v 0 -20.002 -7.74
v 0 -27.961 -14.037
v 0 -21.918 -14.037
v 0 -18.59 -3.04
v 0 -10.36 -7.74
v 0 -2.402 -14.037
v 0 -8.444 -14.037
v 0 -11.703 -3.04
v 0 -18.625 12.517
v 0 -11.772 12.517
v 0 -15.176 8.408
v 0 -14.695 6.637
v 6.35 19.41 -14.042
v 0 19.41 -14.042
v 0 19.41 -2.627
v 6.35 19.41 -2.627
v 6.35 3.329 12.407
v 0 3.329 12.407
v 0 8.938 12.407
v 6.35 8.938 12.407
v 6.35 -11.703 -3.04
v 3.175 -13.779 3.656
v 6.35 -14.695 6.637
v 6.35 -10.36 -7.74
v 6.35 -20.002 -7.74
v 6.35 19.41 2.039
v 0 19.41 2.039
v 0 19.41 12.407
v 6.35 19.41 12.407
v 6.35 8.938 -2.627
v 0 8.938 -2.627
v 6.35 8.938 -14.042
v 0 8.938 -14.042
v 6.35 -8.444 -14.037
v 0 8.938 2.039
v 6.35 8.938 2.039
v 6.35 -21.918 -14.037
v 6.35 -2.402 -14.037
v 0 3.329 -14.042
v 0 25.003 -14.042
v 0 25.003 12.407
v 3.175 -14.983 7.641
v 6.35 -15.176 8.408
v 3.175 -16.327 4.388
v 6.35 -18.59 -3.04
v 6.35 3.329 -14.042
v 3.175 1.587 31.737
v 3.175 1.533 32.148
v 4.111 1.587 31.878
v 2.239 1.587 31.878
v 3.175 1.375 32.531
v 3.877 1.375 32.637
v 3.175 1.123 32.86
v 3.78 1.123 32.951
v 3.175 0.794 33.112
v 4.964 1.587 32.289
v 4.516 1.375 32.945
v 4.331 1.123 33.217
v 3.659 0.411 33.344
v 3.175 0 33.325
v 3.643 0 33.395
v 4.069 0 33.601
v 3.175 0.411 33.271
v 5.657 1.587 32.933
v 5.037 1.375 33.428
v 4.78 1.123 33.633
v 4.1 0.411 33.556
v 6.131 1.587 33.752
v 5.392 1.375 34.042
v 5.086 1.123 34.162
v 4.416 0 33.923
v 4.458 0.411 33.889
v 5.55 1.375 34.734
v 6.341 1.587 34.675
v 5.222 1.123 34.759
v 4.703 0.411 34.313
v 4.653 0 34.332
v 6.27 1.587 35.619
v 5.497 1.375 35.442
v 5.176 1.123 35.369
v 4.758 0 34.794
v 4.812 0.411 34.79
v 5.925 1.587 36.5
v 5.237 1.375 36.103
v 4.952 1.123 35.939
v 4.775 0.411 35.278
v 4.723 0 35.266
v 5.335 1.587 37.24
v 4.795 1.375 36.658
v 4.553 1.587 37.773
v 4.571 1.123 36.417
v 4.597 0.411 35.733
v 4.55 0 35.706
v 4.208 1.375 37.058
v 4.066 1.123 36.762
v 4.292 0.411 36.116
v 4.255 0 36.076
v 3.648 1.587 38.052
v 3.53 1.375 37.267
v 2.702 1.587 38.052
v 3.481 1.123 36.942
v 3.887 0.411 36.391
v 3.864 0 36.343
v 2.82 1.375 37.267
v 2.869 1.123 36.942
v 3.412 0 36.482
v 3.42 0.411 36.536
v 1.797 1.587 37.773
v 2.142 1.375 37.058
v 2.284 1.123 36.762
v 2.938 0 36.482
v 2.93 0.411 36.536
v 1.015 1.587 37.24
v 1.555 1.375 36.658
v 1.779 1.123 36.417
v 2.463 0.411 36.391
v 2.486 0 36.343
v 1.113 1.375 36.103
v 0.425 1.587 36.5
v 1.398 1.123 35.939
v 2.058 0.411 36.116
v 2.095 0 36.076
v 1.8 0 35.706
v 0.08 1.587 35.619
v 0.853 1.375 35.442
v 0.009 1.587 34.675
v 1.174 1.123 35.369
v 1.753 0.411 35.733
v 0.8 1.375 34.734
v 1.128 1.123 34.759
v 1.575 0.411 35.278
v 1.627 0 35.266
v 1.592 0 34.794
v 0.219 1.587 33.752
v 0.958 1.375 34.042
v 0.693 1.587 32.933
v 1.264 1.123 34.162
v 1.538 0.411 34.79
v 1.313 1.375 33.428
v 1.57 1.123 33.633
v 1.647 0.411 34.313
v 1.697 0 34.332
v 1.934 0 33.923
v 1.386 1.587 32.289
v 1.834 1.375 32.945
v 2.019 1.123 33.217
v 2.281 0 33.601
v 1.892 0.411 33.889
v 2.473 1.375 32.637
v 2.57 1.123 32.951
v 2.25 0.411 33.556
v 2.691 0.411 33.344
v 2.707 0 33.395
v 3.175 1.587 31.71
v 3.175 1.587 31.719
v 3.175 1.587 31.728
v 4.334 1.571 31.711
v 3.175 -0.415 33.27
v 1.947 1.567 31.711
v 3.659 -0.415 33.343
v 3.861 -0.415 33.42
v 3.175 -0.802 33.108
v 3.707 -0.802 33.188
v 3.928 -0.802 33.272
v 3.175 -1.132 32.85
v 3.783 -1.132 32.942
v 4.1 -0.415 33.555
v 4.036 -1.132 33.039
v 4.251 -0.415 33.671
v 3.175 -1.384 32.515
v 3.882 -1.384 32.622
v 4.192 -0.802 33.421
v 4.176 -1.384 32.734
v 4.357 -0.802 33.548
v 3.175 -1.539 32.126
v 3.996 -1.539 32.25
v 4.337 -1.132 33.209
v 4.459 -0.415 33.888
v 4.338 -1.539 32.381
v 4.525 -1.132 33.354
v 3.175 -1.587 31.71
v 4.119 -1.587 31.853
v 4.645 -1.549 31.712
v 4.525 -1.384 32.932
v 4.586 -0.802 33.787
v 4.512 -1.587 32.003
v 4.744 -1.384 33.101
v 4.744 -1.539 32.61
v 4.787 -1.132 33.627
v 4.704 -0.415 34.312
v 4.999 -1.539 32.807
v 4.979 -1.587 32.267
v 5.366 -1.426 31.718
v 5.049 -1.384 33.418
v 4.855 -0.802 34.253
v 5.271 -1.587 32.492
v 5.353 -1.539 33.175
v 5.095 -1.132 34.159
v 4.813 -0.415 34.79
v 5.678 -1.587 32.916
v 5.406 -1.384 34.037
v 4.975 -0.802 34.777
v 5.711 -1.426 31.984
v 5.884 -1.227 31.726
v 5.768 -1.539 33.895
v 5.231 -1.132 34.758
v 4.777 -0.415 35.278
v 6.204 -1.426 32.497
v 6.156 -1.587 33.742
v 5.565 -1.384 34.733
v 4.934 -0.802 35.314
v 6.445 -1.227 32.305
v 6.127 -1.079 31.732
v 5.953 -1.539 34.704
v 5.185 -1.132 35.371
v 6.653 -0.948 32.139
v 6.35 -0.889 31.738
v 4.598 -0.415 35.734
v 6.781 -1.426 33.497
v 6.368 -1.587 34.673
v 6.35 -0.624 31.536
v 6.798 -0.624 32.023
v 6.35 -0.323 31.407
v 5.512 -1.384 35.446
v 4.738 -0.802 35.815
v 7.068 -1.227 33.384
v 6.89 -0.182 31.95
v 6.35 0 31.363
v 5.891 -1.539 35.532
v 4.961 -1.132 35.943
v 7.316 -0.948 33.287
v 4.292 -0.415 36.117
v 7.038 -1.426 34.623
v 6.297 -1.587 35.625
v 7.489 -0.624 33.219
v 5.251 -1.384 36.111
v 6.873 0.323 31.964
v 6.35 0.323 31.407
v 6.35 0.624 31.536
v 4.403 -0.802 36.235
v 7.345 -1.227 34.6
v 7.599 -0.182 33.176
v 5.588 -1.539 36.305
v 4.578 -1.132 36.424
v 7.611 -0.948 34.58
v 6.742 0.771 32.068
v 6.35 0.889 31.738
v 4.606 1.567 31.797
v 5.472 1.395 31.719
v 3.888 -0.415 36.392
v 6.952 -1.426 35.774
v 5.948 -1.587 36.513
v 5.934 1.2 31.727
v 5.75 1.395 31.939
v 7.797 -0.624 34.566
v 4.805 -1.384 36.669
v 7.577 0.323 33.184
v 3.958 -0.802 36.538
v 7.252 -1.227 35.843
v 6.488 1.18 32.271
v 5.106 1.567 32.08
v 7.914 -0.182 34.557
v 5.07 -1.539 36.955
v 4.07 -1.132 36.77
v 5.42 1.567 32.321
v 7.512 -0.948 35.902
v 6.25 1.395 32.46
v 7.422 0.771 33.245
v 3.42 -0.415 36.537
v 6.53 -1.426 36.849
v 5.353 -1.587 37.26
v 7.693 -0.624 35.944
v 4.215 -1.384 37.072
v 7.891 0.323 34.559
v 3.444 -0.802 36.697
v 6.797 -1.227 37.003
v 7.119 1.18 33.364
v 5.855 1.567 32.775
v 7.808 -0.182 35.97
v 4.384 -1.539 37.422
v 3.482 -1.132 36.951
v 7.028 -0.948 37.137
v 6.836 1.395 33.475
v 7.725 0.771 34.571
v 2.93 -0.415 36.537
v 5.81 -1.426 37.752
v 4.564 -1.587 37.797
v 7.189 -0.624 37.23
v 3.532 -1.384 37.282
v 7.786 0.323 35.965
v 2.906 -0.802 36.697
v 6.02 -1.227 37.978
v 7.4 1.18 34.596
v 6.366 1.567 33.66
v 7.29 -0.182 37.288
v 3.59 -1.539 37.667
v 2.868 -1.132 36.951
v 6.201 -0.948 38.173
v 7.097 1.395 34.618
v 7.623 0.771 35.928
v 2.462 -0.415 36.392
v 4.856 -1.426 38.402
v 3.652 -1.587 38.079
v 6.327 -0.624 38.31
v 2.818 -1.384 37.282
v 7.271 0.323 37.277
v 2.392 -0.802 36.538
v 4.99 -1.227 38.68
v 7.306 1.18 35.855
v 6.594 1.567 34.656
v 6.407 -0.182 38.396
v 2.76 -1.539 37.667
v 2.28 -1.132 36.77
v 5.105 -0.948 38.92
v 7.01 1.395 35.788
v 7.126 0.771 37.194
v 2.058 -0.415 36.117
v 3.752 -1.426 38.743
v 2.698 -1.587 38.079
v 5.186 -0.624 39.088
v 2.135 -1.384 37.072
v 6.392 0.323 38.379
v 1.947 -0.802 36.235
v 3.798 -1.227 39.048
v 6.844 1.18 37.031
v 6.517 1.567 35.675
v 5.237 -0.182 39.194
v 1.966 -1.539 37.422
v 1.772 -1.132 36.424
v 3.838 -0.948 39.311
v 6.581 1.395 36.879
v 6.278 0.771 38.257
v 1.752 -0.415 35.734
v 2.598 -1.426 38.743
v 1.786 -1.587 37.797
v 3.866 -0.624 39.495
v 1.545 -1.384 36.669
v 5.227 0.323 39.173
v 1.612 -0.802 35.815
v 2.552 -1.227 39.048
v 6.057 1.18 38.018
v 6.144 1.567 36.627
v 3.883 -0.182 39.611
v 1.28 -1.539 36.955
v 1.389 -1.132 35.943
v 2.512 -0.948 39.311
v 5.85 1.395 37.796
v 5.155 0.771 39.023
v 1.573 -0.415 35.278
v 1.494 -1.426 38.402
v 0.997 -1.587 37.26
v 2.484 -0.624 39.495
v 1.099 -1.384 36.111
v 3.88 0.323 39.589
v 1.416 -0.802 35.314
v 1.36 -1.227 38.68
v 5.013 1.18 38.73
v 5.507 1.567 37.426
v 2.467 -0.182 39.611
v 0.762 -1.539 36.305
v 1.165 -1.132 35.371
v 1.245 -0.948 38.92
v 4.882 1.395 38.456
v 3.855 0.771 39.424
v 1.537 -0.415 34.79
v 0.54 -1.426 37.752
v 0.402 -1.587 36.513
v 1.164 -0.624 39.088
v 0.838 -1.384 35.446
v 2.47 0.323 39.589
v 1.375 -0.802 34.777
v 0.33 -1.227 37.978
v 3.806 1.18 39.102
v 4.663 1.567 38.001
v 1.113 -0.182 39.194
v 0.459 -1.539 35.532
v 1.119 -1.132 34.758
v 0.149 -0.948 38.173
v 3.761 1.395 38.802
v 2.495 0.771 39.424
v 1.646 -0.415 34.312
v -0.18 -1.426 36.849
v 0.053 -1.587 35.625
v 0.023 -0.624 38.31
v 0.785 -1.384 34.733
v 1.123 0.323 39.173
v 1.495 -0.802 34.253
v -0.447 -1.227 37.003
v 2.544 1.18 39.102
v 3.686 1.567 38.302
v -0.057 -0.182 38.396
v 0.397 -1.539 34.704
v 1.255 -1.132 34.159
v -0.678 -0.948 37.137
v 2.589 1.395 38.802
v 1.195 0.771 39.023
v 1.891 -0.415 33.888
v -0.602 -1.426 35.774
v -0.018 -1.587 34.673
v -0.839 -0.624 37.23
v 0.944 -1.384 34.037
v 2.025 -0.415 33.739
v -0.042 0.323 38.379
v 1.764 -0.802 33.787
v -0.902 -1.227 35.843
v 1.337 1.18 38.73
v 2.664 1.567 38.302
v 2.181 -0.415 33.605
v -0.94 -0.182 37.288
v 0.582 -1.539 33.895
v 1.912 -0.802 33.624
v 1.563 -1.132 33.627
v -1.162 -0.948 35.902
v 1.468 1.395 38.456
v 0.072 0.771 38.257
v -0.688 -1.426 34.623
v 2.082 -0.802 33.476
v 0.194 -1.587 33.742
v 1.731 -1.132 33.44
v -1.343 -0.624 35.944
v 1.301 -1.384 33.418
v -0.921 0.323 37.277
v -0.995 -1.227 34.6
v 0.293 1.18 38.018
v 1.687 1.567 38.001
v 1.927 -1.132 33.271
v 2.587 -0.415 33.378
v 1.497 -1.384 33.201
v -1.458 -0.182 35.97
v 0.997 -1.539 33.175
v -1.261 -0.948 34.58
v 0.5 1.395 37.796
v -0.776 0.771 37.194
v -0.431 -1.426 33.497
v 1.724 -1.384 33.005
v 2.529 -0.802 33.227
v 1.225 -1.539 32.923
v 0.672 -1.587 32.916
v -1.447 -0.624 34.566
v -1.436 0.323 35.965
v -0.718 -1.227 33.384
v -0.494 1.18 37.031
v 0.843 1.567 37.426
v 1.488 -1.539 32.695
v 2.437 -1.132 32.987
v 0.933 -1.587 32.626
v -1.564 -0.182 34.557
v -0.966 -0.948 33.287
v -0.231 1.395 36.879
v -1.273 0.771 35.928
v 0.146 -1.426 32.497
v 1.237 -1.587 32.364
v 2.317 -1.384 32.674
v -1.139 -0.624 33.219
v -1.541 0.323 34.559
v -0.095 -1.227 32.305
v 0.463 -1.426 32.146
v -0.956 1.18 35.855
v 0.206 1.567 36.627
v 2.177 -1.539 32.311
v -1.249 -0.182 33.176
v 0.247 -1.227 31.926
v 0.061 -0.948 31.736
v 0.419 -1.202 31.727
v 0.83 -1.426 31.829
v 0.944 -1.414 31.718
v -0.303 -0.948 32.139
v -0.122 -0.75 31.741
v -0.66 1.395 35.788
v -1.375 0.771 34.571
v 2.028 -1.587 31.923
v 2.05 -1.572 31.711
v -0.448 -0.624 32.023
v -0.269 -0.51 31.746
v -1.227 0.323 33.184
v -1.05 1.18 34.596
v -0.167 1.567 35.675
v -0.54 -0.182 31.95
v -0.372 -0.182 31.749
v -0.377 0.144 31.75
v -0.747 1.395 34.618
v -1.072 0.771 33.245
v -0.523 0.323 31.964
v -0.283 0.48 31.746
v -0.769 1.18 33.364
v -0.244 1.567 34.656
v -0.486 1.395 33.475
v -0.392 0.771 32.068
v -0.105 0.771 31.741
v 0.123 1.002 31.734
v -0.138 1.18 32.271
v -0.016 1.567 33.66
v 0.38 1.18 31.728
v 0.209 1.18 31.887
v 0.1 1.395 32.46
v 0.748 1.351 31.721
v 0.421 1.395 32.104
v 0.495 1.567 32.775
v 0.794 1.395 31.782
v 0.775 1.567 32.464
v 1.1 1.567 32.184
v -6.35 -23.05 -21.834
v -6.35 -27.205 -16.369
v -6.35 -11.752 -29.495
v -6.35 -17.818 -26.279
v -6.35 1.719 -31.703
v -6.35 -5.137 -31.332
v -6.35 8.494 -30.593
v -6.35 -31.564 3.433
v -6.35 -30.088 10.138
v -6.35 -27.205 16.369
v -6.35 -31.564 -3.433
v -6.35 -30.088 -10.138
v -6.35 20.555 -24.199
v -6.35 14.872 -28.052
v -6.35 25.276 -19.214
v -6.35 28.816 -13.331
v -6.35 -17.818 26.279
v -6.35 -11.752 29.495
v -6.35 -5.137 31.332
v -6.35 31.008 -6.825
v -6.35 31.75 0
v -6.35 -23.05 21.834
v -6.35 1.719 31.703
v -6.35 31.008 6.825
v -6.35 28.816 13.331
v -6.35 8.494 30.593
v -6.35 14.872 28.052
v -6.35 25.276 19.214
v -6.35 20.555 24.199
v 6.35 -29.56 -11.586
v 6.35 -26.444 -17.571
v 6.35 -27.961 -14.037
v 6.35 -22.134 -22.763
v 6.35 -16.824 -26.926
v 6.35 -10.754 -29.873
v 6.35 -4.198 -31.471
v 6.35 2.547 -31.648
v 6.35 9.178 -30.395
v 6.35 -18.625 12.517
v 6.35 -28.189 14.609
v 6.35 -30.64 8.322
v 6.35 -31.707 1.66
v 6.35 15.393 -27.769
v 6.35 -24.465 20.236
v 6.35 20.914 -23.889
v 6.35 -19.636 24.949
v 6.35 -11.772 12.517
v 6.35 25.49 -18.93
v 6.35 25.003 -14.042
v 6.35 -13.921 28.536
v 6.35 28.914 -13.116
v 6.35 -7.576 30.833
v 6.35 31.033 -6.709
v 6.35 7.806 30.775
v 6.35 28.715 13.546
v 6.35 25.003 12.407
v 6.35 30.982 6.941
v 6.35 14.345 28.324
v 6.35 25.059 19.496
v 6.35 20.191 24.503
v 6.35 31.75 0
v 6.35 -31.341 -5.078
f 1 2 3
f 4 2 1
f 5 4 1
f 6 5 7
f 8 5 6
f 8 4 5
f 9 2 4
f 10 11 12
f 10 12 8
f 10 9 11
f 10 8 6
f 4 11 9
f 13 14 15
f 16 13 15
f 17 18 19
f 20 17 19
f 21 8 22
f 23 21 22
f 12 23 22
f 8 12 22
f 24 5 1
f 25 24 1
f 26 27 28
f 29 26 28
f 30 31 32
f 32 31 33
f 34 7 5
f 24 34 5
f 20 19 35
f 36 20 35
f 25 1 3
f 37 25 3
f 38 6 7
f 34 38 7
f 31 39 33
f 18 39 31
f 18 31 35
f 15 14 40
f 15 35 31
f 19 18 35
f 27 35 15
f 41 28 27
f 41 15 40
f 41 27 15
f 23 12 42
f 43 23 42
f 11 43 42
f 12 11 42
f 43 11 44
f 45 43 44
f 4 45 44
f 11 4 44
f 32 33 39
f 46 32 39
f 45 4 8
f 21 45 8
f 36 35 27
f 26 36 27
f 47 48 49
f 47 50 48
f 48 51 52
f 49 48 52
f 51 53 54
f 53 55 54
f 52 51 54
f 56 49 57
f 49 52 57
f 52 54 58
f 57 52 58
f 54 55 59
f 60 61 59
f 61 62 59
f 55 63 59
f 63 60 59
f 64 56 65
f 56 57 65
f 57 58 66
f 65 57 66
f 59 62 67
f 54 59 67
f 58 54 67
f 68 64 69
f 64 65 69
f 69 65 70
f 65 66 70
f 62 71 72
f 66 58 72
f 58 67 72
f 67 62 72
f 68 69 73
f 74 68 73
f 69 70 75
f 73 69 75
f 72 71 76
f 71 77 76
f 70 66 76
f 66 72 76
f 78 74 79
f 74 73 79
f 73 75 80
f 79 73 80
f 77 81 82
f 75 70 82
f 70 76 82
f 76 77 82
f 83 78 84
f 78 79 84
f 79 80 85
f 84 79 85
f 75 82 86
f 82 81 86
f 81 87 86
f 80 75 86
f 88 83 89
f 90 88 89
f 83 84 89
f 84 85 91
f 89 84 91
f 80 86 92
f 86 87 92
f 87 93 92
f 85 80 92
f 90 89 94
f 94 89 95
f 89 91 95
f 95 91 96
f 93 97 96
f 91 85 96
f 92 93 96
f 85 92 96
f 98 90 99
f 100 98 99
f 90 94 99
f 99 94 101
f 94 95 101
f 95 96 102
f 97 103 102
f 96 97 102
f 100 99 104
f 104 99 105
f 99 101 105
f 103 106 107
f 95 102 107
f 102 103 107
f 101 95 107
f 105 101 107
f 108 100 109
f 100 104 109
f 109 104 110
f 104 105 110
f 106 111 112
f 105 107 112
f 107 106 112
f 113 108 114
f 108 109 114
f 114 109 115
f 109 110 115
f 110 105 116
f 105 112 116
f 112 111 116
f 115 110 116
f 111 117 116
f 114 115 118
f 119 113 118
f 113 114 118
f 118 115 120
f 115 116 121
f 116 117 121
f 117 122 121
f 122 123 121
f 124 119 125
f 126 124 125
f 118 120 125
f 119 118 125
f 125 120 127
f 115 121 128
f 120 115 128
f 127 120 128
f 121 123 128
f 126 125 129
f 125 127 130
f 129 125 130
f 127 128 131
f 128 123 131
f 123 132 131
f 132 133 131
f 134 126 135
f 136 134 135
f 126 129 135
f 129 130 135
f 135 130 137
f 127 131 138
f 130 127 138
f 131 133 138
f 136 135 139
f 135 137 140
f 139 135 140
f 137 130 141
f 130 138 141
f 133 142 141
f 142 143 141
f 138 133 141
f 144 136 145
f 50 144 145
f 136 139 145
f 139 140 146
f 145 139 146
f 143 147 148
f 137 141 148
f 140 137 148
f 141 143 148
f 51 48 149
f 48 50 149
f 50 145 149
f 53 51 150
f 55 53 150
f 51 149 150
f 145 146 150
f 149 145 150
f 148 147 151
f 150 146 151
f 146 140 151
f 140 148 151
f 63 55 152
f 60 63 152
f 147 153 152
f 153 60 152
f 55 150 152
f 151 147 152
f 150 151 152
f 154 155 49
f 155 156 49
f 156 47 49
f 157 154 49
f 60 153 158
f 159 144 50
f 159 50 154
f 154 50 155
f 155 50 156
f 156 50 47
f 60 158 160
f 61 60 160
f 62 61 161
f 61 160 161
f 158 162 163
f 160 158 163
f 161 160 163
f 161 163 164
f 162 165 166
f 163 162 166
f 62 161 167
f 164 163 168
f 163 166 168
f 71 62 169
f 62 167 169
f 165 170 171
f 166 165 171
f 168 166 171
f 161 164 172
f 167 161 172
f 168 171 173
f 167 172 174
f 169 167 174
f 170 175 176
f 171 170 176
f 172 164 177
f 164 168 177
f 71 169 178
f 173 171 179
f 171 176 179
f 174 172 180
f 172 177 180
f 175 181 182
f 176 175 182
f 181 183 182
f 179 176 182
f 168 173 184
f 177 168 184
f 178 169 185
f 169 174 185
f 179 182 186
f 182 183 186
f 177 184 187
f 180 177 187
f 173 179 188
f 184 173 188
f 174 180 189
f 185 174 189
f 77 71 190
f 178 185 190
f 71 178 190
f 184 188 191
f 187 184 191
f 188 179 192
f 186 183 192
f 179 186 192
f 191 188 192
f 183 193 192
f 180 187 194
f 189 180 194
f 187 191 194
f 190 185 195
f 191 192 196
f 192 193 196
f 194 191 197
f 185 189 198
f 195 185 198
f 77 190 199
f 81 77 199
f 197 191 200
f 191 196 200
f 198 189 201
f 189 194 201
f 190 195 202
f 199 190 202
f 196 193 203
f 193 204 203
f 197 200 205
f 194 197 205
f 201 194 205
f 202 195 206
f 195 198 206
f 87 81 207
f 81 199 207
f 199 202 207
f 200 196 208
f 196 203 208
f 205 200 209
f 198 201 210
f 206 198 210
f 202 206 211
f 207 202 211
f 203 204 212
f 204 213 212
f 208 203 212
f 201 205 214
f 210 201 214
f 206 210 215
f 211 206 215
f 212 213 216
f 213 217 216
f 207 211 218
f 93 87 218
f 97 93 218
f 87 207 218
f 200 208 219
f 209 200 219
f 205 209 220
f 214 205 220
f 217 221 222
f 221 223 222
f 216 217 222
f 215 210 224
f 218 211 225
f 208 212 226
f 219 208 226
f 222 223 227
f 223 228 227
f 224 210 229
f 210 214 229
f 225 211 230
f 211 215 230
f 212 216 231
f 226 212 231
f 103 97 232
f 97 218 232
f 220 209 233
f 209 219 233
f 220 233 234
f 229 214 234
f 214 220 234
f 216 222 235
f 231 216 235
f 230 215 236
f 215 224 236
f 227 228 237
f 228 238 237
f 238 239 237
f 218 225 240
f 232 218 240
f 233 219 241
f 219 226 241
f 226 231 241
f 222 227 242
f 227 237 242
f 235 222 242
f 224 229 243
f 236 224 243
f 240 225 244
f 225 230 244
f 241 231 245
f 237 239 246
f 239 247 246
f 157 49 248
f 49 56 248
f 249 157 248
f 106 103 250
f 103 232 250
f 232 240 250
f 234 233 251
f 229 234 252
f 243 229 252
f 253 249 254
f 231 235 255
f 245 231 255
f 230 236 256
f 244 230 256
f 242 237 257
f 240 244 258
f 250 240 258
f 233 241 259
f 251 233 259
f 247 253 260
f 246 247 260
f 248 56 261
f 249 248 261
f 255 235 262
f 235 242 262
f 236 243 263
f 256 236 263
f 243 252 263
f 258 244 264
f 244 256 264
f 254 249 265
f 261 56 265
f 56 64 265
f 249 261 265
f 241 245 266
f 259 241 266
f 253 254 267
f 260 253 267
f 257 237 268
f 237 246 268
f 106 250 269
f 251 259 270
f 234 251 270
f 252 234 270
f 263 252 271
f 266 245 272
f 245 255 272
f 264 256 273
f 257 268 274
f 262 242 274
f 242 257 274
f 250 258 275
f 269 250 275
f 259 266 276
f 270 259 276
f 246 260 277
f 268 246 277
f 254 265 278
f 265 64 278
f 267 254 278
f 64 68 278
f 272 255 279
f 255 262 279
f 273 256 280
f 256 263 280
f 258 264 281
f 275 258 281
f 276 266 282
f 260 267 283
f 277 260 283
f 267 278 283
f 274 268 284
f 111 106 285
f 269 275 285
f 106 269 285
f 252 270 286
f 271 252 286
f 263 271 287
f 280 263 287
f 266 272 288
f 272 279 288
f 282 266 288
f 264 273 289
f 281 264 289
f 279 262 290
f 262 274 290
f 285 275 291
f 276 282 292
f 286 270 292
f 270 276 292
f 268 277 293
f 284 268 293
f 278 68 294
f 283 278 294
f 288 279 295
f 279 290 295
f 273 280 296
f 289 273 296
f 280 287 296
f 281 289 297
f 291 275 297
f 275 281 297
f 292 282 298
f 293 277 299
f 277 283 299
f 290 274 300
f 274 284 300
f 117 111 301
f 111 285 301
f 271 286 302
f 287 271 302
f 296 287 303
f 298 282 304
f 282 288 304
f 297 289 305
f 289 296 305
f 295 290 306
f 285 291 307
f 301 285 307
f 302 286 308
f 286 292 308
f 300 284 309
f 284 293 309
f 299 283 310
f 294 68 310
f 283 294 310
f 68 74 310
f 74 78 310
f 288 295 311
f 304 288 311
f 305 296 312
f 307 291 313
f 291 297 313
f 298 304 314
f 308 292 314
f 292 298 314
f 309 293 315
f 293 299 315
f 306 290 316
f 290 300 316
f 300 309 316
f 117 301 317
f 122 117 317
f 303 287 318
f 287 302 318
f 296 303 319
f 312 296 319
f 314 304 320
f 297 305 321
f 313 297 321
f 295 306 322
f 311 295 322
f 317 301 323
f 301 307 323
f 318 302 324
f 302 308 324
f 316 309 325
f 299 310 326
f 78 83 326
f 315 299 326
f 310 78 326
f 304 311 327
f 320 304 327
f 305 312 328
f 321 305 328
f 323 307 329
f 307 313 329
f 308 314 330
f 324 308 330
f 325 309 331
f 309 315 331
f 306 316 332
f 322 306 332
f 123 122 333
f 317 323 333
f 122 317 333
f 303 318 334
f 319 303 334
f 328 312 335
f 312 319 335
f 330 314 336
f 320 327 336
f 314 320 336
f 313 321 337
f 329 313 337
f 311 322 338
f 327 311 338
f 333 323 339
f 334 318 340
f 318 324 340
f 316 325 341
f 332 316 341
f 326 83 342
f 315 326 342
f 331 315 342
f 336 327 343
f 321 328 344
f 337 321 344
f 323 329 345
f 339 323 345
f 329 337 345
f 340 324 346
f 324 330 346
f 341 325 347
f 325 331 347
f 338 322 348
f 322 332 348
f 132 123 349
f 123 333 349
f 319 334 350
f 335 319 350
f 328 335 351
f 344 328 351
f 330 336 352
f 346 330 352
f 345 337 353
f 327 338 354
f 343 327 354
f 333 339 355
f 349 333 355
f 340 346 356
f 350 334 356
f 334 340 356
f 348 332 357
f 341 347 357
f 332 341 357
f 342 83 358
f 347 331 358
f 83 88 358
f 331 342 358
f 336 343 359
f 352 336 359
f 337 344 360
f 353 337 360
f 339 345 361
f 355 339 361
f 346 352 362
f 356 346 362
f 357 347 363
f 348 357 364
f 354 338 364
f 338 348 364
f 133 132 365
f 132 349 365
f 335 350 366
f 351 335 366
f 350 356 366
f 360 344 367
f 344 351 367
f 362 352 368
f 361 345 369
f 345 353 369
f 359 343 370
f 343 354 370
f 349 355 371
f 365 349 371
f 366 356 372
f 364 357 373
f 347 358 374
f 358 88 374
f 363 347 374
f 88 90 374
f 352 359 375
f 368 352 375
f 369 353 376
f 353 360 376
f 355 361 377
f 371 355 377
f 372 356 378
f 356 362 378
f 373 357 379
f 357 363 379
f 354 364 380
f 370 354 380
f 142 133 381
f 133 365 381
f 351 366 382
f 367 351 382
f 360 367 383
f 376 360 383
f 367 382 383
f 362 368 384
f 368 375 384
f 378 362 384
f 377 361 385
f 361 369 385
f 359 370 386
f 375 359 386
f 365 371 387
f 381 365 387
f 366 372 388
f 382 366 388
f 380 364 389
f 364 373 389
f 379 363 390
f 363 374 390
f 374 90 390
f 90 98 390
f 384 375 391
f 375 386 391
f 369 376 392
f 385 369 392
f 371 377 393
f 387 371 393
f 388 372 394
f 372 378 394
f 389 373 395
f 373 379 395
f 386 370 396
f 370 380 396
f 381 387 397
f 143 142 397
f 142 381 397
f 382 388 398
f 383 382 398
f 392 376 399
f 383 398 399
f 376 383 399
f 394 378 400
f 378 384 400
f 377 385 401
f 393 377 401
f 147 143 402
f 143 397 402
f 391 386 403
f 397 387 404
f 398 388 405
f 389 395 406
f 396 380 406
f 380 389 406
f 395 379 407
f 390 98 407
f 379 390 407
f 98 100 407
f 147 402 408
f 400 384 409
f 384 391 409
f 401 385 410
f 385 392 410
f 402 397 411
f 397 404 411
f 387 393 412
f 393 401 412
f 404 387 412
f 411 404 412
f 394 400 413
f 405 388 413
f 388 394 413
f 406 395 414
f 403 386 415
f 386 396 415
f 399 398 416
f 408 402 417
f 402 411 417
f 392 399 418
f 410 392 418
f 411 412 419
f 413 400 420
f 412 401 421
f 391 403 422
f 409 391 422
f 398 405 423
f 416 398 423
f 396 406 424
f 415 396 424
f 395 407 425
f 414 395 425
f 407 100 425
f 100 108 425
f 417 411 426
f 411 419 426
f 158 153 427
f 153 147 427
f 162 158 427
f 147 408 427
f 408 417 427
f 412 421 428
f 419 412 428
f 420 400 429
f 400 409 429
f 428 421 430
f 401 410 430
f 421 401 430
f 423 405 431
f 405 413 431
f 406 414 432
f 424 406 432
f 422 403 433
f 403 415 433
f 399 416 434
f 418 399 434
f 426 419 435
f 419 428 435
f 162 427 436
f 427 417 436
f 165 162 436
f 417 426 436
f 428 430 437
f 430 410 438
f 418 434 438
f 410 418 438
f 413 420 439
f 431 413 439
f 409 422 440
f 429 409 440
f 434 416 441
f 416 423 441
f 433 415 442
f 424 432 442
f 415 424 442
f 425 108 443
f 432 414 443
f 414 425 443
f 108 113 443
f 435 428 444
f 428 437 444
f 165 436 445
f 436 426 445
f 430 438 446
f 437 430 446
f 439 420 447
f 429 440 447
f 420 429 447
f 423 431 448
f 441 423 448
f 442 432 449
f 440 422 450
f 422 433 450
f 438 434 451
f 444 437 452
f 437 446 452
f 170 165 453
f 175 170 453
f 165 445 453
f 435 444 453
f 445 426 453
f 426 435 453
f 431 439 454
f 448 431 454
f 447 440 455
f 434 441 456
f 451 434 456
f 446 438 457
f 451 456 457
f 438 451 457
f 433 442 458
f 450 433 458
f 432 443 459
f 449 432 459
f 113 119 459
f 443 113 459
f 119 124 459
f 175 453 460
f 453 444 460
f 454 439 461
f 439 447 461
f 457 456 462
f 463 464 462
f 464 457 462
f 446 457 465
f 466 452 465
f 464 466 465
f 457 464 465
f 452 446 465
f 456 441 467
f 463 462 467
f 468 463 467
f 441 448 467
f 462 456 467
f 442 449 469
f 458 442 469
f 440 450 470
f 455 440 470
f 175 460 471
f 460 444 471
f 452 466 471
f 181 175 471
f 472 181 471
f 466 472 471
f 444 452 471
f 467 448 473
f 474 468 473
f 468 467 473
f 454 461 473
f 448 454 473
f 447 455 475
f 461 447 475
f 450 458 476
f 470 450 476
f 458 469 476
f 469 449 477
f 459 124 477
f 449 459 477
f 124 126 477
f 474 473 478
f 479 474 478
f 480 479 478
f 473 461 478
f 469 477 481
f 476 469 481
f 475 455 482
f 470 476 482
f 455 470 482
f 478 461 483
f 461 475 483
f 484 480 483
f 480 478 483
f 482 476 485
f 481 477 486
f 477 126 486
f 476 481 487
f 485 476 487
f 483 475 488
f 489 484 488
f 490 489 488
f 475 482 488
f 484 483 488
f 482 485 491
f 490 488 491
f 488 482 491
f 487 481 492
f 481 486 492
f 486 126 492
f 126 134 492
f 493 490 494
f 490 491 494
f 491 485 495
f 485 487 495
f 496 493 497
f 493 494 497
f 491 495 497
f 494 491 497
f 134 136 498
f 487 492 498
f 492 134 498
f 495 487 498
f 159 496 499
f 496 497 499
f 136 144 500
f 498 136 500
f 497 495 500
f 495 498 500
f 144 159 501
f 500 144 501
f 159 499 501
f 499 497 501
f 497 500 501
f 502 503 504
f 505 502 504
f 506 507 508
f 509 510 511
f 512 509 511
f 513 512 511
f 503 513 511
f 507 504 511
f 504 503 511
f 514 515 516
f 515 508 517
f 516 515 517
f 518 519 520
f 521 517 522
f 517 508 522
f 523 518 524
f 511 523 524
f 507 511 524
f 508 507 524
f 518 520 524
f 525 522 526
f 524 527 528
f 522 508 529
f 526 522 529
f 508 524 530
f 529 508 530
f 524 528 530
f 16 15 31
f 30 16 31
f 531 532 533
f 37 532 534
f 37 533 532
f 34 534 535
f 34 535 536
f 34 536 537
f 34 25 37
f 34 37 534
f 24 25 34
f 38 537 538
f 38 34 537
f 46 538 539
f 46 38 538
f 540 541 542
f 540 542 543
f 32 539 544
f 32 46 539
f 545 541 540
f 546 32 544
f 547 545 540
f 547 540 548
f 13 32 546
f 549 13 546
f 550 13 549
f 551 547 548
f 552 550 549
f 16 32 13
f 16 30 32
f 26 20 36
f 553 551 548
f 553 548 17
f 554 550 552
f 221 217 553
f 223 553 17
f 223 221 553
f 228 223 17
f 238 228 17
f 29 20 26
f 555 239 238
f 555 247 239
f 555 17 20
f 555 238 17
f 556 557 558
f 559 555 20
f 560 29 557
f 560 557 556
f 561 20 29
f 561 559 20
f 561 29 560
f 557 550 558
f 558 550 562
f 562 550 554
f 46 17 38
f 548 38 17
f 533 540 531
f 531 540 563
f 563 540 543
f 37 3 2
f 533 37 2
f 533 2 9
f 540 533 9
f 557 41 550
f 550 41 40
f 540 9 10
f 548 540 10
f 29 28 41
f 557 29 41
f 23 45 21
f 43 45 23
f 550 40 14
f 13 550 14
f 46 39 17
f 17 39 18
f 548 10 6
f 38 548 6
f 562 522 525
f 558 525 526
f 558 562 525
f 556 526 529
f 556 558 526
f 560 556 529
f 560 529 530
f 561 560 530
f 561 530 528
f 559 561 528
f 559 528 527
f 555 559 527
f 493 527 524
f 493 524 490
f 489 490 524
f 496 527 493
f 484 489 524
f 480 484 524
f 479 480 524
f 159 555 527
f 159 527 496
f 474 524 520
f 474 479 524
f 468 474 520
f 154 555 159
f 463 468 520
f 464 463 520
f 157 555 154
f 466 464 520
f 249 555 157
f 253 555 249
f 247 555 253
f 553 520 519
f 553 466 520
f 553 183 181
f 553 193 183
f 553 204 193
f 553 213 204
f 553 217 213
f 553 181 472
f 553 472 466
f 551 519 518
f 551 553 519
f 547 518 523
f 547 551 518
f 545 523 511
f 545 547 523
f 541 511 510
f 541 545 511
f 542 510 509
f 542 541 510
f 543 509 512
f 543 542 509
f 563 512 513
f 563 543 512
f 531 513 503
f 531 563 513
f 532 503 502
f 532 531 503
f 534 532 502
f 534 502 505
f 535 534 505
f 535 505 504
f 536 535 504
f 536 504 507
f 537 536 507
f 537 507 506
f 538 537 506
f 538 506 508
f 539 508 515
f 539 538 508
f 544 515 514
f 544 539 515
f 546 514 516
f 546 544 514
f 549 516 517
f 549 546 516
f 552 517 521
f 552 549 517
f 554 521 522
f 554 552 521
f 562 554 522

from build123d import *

# Parameters (mm, degrees)
F1_R     = 31.75
F2_DEPTH = 6.35
F0_R     = 31.75
F3_DEPTH = 6.35
F4_DEPTH = 6.35


with BuildPart() as f2:
    # F1 (on Right) → F2 (new body)
    with BuildSketch(Plane.YZ):
        Circle(F1_R)
        Polygon((-2.4019205729, -14.036842106), (-8.4443424479, -14.036842106), (-10.3600911458, -7.7397587727), (-20.0025, -7.7397587727), (-21.9182486979, -14.036842106), (-27.9606705729, -14.036842106), (-18.6250130208, 12.5174026857), (-11.7723046875, 12.5174026857), align=None, mode=Mode.SUBTRACT)
        Polygon((25.0025882936, 12.4073878214), (25.0025882936, -14.0424445271), (19.4104372652, -14.0424445271), (19.4104372652, -2.6265834216), (8.9381792835, -2.6265834216), (8.9381792835, -14.0424445271), (3.3286613264, -14.0424445271), (3.3286613264, 12.4073878214), (8.9381792835, 12.4073878214), (8.9381792835, 2.0393314117), (19.4104372652, 2.0393314117), (19.4104372652, 12.4073878214), align=None, mode=Mode.SUBTRACT)
    extrude(amount=F2_DEPTH)

    # F0 (on Right) → F3 (join)
    with BuildSketch(Plane.YZ):
        Circle(F0_R)
    extrude(amount=-F3_DEPTH)

    # F1 (on Right) → F4 (join)
    with BuildSketch(Plane.YZ):
        with BuildLine():
            Line((-18.5902864583, -3.0400973143), (-11.7028515625, -3.0400973143))
            add(Edge.make_bspline(
                [(-11.7028515625, -3.0400973143), (-14.3594335937, 5.5142125815), (-14.6951236979, 6.6370381023)],
                knots=[0, 0, 0, 1, 1, 1], degree=2))
            add(Edge.make_bspline(
                [(-14.6951236979, 6.6370381023), (-15.0308138021, 7.7598636232), (-15.1755078125, 8.4080927898)],
                knots=[0, 0, 0, 1, 1, 1], degree=2))
            add(Edge.make_bspline(
                [(-15.1755078125, 8.4080927898), (-15.7716471354, 6.0929886232), (-18.5902864583, -3.0400973143)],
                knots=[0, 0, 0, 1, 1, 1], degree=2))
        make_face()
    extrude(amount=F4_DEPTH)

    # F6 (on offset) → F7 (revolve)
    with BuildSketch(Plane.YZ.offset(3.175)):
        with BuildLine():
            ThreePointArc((0, 33.324831301), (-1.1225320151, 30.6147992858), (1.5875, 31.737331301))
            ThreePointArc((1.5875, 31.737331301), (1.1225320151, 32.8598633161), (0, 33.324831301))
        make_face()
    revolve(axis=Axis((3.175, -10.2093983442, 34.912331301), (0, -1, 0)))


solid = f2.part
